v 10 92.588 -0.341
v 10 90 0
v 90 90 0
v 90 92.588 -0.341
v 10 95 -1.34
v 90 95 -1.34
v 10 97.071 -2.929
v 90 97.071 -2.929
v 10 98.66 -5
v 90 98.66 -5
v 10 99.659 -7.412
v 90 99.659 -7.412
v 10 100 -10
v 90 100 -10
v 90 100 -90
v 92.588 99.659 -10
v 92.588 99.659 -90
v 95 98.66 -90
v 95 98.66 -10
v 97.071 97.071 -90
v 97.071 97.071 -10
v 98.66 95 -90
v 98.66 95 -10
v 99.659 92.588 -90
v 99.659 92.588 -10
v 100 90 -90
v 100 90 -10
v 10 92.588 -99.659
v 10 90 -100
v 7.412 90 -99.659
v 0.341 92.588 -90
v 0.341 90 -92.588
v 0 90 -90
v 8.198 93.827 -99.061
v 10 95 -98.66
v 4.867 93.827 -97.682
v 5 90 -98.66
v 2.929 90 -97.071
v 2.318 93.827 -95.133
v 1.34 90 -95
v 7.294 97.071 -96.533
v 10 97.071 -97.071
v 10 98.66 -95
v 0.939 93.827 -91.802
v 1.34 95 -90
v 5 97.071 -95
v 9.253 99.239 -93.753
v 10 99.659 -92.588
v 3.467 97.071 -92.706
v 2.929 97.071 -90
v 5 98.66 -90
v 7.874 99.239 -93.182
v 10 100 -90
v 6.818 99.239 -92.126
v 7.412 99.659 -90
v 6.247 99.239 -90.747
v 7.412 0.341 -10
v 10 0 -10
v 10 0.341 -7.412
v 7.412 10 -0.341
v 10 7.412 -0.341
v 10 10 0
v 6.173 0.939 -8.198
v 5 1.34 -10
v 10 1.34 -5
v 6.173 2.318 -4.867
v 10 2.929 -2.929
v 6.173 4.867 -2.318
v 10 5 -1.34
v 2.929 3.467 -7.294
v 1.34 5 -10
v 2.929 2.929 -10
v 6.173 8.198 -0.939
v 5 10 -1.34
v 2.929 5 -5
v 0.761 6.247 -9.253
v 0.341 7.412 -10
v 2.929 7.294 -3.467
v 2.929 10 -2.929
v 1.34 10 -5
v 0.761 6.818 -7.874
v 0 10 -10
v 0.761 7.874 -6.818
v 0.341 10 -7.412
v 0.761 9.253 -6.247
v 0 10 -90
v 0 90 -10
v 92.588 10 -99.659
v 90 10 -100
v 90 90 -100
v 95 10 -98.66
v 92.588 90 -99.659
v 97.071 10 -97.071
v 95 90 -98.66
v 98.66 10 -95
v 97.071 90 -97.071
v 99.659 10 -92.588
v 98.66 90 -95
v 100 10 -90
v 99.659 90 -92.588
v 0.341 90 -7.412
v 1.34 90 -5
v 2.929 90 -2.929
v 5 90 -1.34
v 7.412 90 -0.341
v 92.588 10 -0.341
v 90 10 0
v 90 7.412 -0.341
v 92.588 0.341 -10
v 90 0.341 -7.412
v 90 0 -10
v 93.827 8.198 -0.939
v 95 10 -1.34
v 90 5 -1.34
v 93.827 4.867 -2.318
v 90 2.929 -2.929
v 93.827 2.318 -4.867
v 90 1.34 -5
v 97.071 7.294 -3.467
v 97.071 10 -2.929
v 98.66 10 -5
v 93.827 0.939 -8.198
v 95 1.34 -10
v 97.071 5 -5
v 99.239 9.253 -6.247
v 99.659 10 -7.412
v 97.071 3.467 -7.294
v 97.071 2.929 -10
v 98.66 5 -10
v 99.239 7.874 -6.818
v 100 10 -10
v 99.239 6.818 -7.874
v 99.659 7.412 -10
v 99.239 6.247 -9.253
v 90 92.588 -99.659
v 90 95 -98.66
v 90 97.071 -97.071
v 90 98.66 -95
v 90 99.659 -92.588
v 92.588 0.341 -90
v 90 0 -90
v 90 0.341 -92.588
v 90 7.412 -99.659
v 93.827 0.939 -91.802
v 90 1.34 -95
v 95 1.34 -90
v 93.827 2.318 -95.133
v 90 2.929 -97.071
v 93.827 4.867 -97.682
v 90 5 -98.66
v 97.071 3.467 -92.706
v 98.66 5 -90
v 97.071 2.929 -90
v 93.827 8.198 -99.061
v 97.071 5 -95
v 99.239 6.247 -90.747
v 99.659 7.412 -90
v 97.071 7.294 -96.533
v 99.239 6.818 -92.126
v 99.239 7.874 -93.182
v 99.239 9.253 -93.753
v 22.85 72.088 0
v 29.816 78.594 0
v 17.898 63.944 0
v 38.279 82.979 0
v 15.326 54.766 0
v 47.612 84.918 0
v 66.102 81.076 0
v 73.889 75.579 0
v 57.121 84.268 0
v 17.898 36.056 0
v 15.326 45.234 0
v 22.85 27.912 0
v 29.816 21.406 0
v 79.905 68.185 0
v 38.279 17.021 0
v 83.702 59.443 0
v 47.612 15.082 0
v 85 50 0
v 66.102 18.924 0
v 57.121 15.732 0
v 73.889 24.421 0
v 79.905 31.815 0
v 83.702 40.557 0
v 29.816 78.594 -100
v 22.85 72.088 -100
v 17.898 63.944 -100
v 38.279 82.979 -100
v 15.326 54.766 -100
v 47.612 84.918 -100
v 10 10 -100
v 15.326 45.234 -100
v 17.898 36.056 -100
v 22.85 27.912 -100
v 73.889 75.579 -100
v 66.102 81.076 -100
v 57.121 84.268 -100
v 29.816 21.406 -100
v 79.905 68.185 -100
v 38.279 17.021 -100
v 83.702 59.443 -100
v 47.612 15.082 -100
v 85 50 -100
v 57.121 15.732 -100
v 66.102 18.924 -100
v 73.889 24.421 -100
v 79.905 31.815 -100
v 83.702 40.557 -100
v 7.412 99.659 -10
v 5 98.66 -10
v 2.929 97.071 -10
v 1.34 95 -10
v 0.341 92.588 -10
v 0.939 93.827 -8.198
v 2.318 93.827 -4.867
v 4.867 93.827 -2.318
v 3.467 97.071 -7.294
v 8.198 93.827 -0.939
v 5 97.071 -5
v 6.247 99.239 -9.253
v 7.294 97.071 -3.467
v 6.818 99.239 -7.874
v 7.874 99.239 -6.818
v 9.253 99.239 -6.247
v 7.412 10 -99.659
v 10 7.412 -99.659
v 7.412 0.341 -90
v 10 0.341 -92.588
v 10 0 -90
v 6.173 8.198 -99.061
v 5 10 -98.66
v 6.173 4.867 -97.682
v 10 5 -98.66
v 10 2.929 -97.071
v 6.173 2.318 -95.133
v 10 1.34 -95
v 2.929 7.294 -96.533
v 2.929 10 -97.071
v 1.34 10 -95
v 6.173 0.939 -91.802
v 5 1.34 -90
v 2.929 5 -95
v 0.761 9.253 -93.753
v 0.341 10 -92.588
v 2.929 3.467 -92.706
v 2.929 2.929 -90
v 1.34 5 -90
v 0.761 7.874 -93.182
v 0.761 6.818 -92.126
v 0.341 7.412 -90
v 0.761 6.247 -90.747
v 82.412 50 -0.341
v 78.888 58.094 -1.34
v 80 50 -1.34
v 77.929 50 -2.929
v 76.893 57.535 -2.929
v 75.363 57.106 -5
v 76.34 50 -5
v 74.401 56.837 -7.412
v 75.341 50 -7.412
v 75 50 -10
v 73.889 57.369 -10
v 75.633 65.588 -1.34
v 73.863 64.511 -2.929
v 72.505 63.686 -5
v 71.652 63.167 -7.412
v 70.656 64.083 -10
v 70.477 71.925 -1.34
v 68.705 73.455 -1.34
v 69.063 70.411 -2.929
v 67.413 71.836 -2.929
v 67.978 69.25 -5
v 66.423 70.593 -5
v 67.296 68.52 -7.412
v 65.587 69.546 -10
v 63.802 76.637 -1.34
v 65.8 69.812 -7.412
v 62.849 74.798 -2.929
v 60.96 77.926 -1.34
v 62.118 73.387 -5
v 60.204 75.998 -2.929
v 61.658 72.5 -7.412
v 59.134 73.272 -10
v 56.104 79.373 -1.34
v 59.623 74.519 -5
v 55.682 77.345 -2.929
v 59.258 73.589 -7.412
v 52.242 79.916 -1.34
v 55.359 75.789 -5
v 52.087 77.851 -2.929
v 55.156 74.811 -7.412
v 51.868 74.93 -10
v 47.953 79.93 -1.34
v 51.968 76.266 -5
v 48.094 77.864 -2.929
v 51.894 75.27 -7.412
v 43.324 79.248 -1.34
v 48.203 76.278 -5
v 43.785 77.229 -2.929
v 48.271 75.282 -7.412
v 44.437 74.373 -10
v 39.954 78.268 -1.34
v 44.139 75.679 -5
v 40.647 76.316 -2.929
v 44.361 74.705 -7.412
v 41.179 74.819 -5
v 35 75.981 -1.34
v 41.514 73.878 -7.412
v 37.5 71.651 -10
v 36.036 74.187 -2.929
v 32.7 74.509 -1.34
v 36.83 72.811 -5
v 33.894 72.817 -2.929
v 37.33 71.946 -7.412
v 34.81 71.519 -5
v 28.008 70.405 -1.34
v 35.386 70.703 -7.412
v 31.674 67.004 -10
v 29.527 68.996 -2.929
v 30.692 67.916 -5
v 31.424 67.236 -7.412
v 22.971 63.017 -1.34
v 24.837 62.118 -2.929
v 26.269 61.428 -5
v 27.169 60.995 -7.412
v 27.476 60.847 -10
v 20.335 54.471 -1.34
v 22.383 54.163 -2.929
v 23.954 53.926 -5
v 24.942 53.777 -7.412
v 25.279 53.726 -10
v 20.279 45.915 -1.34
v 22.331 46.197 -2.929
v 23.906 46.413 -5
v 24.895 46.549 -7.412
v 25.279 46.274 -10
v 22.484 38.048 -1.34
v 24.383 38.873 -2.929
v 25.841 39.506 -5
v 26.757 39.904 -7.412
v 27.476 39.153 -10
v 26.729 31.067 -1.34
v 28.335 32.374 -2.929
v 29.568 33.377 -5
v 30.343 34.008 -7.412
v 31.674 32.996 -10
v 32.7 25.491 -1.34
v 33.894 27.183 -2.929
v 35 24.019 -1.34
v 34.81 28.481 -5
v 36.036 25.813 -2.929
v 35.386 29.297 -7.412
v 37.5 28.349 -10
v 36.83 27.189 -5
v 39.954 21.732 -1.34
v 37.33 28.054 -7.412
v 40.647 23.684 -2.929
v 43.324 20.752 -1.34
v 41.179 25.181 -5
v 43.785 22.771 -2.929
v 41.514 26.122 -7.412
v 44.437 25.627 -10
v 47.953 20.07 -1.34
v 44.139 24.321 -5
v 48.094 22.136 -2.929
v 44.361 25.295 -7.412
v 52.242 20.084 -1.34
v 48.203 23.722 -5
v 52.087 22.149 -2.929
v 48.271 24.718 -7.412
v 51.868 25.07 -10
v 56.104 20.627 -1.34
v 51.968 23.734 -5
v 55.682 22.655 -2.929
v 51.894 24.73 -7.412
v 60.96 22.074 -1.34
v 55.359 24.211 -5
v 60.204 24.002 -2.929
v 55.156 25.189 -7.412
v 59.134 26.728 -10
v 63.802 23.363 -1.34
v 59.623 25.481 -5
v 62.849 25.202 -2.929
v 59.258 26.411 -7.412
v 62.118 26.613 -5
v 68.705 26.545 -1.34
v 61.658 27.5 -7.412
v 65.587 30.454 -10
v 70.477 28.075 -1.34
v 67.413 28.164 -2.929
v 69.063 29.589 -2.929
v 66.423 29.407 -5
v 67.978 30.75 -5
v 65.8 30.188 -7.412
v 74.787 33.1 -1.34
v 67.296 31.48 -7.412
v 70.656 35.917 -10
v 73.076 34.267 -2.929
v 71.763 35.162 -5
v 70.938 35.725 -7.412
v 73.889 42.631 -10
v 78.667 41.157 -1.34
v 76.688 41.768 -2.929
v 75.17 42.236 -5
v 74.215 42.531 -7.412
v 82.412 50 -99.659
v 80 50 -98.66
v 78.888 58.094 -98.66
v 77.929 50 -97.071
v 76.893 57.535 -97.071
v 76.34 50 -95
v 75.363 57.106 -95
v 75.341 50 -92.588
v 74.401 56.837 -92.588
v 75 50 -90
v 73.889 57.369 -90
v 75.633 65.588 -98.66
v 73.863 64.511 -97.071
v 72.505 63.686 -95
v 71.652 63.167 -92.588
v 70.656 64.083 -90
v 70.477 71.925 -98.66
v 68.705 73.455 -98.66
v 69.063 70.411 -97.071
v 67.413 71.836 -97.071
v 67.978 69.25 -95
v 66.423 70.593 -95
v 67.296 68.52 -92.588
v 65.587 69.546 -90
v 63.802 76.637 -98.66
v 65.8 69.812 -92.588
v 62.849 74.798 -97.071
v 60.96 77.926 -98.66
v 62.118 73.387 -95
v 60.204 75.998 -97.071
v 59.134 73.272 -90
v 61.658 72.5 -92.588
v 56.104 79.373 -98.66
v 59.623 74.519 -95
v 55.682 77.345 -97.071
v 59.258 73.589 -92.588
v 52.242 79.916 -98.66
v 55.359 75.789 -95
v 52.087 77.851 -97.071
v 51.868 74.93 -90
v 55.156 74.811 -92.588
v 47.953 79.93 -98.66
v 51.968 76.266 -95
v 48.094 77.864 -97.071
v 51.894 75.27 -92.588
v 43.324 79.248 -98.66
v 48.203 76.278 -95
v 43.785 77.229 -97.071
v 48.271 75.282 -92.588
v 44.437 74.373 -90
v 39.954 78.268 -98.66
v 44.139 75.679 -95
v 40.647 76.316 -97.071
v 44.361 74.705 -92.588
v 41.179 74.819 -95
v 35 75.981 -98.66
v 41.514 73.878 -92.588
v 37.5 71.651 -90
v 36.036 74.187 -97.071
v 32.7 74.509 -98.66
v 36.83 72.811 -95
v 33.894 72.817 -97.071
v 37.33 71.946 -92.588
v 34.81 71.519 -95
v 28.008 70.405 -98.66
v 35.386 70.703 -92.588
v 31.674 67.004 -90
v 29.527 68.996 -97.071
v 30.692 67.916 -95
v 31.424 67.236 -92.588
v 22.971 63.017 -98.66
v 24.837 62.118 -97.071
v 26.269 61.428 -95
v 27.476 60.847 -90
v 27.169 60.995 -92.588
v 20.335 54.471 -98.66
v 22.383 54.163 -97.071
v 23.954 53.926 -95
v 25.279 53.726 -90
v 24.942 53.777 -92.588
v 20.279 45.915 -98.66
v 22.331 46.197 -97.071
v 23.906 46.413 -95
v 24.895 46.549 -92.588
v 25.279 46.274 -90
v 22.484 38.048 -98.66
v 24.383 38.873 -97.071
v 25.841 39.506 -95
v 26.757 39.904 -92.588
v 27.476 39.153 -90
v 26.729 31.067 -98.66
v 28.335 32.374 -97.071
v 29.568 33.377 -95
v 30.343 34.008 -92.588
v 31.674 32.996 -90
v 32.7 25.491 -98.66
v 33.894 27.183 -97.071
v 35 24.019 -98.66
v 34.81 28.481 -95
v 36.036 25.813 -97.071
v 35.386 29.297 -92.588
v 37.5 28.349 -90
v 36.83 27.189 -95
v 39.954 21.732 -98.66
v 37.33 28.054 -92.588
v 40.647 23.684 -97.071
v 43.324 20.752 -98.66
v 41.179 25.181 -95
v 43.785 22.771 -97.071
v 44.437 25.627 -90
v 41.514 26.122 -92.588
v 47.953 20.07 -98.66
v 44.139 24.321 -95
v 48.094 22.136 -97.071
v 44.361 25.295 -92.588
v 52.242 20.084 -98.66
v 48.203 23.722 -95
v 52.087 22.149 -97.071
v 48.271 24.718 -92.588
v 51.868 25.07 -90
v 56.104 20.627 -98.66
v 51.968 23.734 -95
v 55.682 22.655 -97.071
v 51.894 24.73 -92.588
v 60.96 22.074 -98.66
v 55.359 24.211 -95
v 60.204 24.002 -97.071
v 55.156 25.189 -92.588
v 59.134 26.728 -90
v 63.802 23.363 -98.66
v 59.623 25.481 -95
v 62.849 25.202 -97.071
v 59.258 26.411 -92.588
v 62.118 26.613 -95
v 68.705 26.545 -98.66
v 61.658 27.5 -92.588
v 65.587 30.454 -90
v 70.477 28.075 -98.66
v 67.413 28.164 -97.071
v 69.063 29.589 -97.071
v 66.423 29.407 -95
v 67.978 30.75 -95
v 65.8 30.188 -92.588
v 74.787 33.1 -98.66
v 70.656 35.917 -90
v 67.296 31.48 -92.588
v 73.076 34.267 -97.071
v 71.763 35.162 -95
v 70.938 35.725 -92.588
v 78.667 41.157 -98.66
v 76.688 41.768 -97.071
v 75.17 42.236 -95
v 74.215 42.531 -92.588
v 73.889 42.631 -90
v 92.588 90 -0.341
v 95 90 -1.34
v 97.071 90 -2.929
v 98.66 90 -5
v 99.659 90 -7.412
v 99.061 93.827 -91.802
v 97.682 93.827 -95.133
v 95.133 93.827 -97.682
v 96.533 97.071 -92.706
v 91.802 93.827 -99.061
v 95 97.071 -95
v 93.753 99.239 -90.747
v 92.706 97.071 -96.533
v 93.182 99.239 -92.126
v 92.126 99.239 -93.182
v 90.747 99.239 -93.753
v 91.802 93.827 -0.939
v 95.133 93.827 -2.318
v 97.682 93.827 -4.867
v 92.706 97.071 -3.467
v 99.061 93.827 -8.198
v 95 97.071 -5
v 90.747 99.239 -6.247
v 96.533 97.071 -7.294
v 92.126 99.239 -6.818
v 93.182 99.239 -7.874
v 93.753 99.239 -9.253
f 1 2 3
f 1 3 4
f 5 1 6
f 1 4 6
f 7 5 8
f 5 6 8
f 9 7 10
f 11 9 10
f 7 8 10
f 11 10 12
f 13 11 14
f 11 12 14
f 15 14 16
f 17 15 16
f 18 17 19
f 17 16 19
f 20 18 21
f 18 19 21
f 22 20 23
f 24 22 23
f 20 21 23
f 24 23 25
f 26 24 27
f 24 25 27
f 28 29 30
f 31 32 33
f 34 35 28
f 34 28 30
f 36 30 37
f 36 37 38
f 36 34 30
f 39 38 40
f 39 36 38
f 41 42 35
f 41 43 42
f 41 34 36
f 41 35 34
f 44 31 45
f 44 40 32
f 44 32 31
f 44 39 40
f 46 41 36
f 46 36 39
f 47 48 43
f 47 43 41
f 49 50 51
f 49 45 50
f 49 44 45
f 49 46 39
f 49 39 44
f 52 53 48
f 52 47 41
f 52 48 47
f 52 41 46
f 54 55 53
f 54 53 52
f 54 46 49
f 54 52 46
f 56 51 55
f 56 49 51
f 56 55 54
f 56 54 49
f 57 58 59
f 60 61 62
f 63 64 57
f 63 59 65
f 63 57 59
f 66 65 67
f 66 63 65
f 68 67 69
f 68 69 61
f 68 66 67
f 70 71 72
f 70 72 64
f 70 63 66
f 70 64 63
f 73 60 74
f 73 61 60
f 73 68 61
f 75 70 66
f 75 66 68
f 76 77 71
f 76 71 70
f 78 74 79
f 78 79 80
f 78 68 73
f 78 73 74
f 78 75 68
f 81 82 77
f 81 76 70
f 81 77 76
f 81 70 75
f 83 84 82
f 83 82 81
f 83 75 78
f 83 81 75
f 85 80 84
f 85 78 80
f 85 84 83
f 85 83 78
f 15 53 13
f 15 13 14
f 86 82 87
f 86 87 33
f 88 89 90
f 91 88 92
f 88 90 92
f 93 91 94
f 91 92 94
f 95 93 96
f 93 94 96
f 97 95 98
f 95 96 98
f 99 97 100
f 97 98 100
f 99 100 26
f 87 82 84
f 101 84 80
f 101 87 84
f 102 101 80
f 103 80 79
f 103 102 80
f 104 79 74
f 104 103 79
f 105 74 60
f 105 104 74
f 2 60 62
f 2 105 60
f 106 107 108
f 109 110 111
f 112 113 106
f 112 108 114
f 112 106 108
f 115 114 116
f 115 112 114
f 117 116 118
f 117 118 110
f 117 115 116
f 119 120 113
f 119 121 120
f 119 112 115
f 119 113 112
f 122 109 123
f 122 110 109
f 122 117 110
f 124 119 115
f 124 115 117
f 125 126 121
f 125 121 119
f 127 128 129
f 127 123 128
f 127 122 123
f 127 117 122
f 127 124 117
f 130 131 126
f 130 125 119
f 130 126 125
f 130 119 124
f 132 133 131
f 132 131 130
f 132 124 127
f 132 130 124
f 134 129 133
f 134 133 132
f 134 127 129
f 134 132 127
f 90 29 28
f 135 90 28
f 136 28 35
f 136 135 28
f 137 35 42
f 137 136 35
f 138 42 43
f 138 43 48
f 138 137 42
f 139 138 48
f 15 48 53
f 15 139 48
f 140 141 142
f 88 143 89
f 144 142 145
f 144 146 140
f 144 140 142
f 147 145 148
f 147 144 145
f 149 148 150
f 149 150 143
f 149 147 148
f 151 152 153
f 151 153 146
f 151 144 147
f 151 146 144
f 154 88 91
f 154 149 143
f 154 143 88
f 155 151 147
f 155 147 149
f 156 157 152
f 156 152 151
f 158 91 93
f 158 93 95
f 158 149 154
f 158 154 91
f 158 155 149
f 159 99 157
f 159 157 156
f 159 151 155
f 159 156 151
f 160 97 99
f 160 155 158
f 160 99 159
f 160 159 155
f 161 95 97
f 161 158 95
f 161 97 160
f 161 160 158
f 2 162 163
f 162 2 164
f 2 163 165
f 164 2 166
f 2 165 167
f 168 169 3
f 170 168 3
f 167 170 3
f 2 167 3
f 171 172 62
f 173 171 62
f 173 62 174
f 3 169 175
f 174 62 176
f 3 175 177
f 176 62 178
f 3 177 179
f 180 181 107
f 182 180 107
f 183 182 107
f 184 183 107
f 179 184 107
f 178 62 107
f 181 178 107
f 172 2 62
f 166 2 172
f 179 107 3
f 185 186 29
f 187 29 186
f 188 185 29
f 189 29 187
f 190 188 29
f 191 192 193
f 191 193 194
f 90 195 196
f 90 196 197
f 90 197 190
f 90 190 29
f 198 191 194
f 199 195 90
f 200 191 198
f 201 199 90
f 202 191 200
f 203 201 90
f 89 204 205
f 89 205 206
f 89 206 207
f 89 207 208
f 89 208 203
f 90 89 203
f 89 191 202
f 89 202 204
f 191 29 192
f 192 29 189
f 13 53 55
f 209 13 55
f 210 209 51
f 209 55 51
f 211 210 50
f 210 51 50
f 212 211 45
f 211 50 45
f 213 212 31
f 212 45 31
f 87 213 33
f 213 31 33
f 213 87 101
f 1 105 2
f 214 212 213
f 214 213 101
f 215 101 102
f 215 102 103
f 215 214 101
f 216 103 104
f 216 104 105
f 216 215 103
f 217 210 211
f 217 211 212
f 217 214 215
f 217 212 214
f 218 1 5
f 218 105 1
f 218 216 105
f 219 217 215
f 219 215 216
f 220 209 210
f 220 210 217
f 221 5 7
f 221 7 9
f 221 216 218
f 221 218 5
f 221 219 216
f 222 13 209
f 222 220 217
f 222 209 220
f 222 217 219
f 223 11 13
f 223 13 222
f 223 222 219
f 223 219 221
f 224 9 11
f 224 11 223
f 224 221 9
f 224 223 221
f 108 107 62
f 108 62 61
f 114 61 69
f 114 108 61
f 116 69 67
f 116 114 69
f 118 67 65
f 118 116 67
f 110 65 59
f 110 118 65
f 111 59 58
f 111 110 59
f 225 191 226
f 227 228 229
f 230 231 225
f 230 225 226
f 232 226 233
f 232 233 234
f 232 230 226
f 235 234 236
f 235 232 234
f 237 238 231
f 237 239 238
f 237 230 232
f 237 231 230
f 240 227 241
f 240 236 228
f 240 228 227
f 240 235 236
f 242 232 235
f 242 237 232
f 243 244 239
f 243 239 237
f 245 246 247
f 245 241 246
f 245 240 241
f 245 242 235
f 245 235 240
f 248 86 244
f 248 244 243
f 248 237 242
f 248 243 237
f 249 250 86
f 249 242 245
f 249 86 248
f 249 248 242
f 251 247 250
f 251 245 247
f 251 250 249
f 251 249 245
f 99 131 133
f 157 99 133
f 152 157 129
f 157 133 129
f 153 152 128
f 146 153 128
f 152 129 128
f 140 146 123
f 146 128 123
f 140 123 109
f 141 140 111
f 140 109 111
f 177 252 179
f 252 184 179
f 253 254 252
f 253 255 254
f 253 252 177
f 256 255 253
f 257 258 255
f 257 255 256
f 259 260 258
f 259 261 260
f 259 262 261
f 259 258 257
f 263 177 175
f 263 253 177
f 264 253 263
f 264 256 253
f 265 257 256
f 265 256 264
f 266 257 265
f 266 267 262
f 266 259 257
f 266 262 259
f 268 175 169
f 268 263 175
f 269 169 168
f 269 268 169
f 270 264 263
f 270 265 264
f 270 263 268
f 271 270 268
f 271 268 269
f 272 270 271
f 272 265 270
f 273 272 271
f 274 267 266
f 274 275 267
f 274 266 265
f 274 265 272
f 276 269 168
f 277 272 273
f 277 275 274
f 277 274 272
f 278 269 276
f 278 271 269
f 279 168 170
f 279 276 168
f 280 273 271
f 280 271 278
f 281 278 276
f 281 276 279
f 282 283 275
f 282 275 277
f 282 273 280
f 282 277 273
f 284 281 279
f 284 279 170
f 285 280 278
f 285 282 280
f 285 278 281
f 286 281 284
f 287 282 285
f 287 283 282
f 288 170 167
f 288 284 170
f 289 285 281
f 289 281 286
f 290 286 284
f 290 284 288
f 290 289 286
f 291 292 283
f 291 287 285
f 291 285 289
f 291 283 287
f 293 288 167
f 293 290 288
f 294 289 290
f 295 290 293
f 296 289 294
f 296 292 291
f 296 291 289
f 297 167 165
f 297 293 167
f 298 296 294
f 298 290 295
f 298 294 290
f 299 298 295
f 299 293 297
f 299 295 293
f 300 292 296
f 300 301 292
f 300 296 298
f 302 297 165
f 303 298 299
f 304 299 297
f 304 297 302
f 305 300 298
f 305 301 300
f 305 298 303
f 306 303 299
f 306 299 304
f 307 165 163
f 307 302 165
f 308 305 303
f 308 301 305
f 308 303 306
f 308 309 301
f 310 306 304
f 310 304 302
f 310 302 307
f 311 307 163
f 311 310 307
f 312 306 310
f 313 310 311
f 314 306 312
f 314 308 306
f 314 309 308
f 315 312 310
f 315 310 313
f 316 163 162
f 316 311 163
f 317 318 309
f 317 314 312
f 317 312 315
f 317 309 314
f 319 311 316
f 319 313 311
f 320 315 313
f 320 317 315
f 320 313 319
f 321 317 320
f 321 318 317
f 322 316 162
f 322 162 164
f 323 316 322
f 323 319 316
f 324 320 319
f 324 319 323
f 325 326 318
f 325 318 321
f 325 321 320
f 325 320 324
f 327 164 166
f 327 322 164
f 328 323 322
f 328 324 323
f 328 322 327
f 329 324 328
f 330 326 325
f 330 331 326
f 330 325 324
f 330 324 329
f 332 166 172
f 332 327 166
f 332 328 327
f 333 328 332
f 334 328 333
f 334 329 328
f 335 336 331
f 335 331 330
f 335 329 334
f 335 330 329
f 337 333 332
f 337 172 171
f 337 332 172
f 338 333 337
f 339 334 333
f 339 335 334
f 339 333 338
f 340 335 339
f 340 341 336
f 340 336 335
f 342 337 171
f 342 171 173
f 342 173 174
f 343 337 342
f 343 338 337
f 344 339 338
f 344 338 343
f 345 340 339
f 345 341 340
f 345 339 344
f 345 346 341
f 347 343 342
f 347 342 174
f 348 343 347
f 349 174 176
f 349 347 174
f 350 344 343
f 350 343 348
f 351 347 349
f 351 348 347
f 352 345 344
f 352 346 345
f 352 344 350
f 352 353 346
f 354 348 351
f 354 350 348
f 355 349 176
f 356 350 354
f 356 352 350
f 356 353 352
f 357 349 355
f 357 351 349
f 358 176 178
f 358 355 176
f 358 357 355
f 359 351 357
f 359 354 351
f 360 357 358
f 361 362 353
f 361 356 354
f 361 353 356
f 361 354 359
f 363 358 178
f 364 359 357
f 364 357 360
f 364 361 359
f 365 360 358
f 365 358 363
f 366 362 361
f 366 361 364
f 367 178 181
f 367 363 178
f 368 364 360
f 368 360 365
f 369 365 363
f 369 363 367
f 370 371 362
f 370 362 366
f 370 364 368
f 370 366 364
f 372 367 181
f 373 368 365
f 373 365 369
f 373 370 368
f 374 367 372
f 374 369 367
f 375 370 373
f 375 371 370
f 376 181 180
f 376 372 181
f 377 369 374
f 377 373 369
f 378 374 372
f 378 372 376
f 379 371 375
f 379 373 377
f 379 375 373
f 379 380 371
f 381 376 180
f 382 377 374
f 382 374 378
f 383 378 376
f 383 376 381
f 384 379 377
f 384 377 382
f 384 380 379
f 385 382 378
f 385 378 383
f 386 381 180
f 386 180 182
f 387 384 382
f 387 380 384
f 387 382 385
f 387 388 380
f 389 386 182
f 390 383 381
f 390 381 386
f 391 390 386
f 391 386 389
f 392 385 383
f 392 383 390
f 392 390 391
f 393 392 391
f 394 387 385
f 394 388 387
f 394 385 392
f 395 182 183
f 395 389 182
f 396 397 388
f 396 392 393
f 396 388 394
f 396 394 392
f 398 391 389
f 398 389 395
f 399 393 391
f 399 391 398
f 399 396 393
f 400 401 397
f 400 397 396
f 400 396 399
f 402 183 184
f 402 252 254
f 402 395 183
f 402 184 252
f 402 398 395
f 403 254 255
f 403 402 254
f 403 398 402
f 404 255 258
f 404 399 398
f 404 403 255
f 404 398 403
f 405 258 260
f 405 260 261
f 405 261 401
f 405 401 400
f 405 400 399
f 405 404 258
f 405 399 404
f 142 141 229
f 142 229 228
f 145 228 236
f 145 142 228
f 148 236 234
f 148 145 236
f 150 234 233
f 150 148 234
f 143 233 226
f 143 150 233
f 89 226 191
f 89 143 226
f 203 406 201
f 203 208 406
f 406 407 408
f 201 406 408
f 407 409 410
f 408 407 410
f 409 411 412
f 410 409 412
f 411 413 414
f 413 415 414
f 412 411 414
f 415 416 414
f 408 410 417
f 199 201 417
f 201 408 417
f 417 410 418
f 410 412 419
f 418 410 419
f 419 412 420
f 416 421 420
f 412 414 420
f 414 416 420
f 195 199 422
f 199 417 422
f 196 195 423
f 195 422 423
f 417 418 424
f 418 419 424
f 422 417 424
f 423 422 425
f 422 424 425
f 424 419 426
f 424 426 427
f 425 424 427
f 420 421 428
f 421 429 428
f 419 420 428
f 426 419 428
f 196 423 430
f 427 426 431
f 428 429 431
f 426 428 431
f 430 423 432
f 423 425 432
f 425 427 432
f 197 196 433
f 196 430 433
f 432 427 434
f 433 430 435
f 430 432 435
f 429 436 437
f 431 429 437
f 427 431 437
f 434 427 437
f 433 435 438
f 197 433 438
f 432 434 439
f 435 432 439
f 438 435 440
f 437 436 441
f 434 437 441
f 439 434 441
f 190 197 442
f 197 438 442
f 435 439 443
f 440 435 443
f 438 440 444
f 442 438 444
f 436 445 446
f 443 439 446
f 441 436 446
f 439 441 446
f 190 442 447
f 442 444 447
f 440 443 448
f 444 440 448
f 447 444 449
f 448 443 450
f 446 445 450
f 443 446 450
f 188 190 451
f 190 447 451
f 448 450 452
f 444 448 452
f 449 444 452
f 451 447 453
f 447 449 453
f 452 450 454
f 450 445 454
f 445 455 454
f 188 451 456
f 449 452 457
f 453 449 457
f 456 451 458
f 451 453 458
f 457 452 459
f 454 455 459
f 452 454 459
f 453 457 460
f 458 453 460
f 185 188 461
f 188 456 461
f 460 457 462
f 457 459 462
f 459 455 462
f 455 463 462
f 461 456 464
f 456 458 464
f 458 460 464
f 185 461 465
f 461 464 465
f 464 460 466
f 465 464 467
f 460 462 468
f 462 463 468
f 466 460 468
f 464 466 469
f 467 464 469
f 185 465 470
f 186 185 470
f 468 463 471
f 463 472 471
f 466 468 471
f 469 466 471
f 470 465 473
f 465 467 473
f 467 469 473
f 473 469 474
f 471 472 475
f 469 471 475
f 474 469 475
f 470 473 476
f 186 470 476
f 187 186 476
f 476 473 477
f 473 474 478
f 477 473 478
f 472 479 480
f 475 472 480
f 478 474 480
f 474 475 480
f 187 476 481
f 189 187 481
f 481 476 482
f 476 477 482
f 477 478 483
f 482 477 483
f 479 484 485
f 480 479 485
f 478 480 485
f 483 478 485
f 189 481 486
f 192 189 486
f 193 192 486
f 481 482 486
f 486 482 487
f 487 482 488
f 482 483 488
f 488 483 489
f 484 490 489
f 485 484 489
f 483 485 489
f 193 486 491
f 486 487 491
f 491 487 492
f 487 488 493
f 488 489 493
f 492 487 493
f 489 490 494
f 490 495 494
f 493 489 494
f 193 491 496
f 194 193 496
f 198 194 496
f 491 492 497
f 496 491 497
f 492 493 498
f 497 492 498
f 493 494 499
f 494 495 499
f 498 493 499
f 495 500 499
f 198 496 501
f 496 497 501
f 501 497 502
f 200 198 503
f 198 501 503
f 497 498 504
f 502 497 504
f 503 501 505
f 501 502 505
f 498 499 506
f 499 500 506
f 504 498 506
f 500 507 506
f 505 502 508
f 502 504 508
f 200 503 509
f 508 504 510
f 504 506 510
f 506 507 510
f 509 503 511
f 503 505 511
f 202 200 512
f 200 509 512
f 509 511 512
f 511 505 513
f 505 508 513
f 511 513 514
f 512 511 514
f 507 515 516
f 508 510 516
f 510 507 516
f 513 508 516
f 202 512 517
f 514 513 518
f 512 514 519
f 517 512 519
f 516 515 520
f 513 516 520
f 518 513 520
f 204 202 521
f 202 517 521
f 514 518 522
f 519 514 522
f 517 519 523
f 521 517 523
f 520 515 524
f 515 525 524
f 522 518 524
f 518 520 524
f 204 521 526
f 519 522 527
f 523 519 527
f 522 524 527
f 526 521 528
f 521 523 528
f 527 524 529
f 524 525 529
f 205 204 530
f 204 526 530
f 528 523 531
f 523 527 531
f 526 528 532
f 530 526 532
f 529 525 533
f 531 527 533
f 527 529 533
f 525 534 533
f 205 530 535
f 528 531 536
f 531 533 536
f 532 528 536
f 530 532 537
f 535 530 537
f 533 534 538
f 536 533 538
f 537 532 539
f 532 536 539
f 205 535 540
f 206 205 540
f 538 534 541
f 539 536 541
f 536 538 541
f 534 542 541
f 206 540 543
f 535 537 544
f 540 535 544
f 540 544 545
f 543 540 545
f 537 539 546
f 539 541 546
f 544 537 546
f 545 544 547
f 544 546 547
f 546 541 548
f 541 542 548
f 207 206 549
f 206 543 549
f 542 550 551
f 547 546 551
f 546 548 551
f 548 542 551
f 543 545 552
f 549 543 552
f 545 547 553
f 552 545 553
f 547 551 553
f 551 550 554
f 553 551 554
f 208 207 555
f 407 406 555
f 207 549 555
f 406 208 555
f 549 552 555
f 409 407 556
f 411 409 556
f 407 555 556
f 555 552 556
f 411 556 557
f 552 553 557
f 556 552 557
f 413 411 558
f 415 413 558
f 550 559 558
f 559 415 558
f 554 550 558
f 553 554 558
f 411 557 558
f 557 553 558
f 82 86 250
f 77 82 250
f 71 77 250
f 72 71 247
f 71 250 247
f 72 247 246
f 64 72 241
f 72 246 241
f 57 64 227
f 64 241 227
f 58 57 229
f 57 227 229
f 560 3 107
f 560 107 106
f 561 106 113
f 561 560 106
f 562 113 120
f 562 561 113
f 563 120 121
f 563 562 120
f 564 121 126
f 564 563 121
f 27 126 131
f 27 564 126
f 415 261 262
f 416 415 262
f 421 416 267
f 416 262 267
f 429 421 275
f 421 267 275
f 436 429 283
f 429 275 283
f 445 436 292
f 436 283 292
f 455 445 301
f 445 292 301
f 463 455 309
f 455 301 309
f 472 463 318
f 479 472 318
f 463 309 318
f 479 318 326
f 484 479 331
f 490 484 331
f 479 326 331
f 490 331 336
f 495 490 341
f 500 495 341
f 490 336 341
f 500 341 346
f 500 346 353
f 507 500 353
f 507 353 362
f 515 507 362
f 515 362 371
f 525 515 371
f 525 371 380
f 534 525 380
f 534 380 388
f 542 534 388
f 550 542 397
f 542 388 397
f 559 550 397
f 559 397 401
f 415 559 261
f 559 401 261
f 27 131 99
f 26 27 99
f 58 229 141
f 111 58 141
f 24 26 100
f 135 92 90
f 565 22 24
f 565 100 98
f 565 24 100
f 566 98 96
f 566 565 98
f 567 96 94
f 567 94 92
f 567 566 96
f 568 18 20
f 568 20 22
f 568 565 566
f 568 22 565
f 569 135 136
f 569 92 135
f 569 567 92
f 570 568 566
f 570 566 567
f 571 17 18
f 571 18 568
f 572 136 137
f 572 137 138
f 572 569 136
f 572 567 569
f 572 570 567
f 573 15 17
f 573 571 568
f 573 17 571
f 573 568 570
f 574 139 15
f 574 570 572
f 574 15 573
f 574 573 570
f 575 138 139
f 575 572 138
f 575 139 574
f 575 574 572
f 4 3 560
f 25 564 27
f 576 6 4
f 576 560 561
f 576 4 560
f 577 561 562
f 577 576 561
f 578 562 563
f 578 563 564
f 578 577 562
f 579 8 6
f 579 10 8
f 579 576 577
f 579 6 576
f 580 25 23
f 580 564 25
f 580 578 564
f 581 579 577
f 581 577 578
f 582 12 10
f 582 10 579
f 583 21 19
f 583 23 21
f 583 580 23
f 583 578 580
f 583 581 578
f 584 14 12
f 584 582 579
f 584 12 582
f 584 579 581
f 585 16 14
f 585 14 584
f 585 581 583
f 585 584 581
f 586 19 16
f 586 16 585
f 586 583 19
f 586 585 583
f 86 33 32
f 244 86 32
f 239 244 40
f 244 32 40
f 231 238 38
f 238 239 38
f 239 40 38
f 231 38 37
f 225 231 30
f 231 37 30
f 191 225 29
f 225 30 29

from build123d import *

# Parameters (mm, degrees)
SKETCH2_W           = 100
SKETCH2_H           = 100
BOSS_EXTRUDE1_DEPTH = 100
SKETCH3_R           = 25
CUT_EXTRUDE1_DEPTH  = 100
FILLET1_R           = 10
FILLET2_R           = 10
FILLET3_R           = 10
FILLET4_R           = 10


with BuildPart() as part:
    # Sketch2 → Boss-Extrude1 (new body)
    with BuildSketch(Plane(origin=(0, 0, 0), x_dir=(1, 0, 0), z_dir=(0, 1, 0))):
        with Locations((50, 50)):
            Rectangle(SKETCH2_W, SKETCH2_H)
    extrude(amount=BOSS_EXTRUDE1_DEPTH)

    # Sketch3 → Cut-Extrude1 (cut)
    with BuildSketch(Plane.XY):
        with Locations((50, 50)):
            Circle(SKETCH3_R)
    extrude(amount=-CUT_EXTRUDE1_DEPTH, mode=Mode.SUBTRACT)

    # Fillet1
    fillet1_edges = [part.edges().sort_by_distance(p)[0] for p in [
        (25, 50, 0),
        (50, 0, 0),
        (100, 50, 0),
        (0, 50, 0),
        (50, 100, 0),
    ]]
    fillet(fillet1_edges, radius=FILLET1_R)

    # Fillet2
    fillet2_edges = [part.edges().sort_by_distance(p)[0] for p in [
        (25, 50, -100),
        (50, 100, -100),
        (50, 0, -100),
        (0, 50, -100),
        (100, 50, -100),
    ]]
    fillet(fillet2_edges, radius=FILLET2_R)

    # Fillet3
    # the kernel refuses this fillet: 10 mm, written as the material it takes off along each edge
    with BuildSketch(Plane(origin=(90, 90, -10), x_dir=(1, 0, 0), z_dir=(0, 1, 0))) as fillet3_piece_1_section:
        Polygon((0, 0), (FILLET3_R, 0), (FILLET3_R, -FILLET3_R), (0, -FILLET3_R), align=None)
    fillet3_piece_1 = extrude(amount=FILLET3_R, mode=Mode.PRIVATE)
    fillet3_piece_1 = fillet3_piece_1 - Plane(origin=(90, 90, -10), x_dir=(-0.7071067811865475, 0, -0.7071067811865475), z_dir=(0, 1, 0)) * Sphere(FILLET3_R, mode=Mode.PRIVATE)
    add(fillet3_piece_1, mode=Mode.SUBTRACT)
    with BuildSketch(Plane(origin=(90, 10, -10), x_dir=(0, -1, 0), z_dir=(1, 0, 0))) as fillet3_piece_2_section:
        Polygon((0, 0), (FILLET3_R, 0), (FILLET3_R, -FILLET3_R), (0, -FILLET3_R), align=None)
    fillet3_piece_2 = extrude(amount=FILLET3_R, mode=Mode.PRIVATE)
    fillet3_piece_2 = fillet3_piece_2 - Plane(origin=(90, 10, -10), x_dir=(0, 0.7071067811865475, -0.7071067811865475), z_dir=(1, 0, 0)) * Sphere(FILLET3_R, mode=Mode.PRIVATE)
    add(fillet3_piece_2, mode=Mode.SUBTRACT)
    with BuildSketch(Plane(origin=(90, 90, -90), x_dir=(1, 0, 0), z_dir=(0, 1, 0))) as fillet3_piece_3_section:
        Polygon((0, 0), (FILLET3_R, 0), (FILLET3_R, FILLET3_R), (0, FILLET3_R), align=None)
    fillet3_piece_3 = extrude(amount=FILLET3_R, mode=Mode.PRIVATE)
    fillet3_piece_3 = fillet3_piece_3 - Plane(origin=(90, 90, -90), x_dir=(-0.7071067811865475, 0, 0.7071067811865475), z_dir=(0, 1, 0)) * Sphere(FILLET3_R, mode=Mode.PRIVATE)
    add(fillet3_piece_3, mode=Mode.SUBTRACT)
    with BuildSketch(Plane(origin=(90, 10, -90), x_dir=(0, -1, 0), z_dir=(1, 0, 0))) as fillet3_piece_4_section:
        Polygon((0, 0), (FILLET3_R, 0), (FILLET3_R, FILLET3_R), (0, FILLET3_R), align=None)
    fillet3_piece_4 = extrude(amount=FILLET3_R, mode=Mode.PRIVATE)
    fillet3_piece_4 = fillet3_piece_4 - Plane(origin=(90, 10, -90), x_dir=(0, 0.7071067811865475, 0.7071067811865475), z_dir=(1, 0, 0)) * Sphere(FILLET3_R, mode=Mode.PRIVATE)
    add(fillet3_piece_4, mode=Mode.SUBTRACT)
    with BuildSketch(Plane(origin=(100, 100, -10), x_dir=(-1, 0, 0), z_dir=(0, 0, -1)), Plane(origin=(100, 0, -10), x_dir=(0, 1, 0), z_dir=(0, 0, -1))) as fillet3_piece_5:
        with BuildLine():
            CenterArc((FILLET3_R, -FILLET3_R), FILLET3_R, 90, 90)
            Line((0, -FILLET3_R), (0, 0))
            Line((0, 0), (FILLET3_R, 0))
        make_face()
    extrude(amount=80, mode=Mode.SUBTRACT)

    # Fillet4
    # the kernel refuses this fillet: 10 mm, written as the material it takes off along each edge
    with BuildSketch(Plane(origin=(10, 90, -10), x_dir=(-1, 0, 0), z_dir=(0, 1, 0))) as fillet4_piece_1_section:
        Polygon((0, 0), (FILLET4_R, 0), (FILLET4_R, FILLET4_R), (0, FILLET4_R), align=None)
    fillet4_piece_1 = extrude(amount=FILLET4_R, mode=Mode.PRIVATE)
    fillet4_piece_1 = fillet4_piece_1 - Plane(origin=(10, 90, -10), x_dir=(0.7071067811865475, 0, -0.7071067811865475), z_dir=(0, 1, 0)) * Sphere(FILLET4_R, mode=Mode.PRIVATE)
    add(fillet4_piece_1, mode=Mode.SUBTRACT)
    with BuildSketch(Plane(origin=(10, 10, -10), x_dir=(0, -1, 0), z_dir=(-1, 0, 0))) as fillet4_piece_2_section:
        Polygon((0, 0), (FILLET4_R, 0), (FILLET4_R, FILLET4_R), (0, FILLET4_R), align=None)
    fillet4_piece_2 = extrude(amount=FILLET4_R, mode=Mode.PRIVATE)
    fillet4_piece_2 = fillet4_piece_2 - Plane(origin=(10, 10, -10), x_dir=(0, 0.7071067811865475, -0.7071067811865475), z_dir=(-1, 0, 0)) * Sphere(FILLET4_R, mode=Mode.PRIVATE)
    add(fillet4_piece_2, mode=Mode.SUBTRACT)
    with BuildSketch(Plane(origin=(10, 90, -90), x_dir=(-1, 0, 0), z_dir=(0, 1, 0))) as fillet4_piece_3_section:
        Polygon((0, 0), (FILLET4_R, 0), (FILLET4_R, -FILLET4_R), (0, -FILLET4_R), align=None)
    fillet4_piece_3 = extrude(amount=FILLET4_R, mode=Mode.PRIVATE)
    fillet4_piece_3 = fillet4_piece_3 - Plane(origin=(10, 90, -90), x_dir=(0.7071067811865475, 0, 0.7071067811865475), z_dir=(0, 1, 0)) * Sphere(FILLET4_R, mode=Mode.PRIVATE)
    add(fillet4_piece_3, mode=Mode.SUBTRACT)
    with BuildSketch(Plane(origin=(10, 10, -90), x_dir=(0, -1, 0), z_dir=(-1, 0, 0))) as fillet4_piece_4_section:
        Polygon((0, 0), (FILLET4_R, 0), (FILLET4_R, -FILLET4_R), (0, -FILLET4_R), align=None)
    fillet4_piece_4 = extrude(amount=FILLET4_R, mode=Mode.PRIVATE)
    fillet4_piece_4 = fillet4_piece_4 - Plane(origin=(10, 10, -90), x_dir=(0, 0.7071067811865475, 0.7071067811865475), z_dir=(-1, 0, 0)) * Sphere(FILLET4_R, mode=Mode.PRIVATE)
    add(fillet4_piece_4, mode=Mode.SUBTRACT)
    with BuildSketch(Plane(origin=(0, 100, -90), x_dir=(1, 0, 0), z_dir=(0, 0, 1)), Plane(origin=(0, 0, -90), x_dir=(0, 1, 0), z_dir=(0, 0, 1))) as fillet4_piece_5:
        with BuildLine():
            CenterArc((FILLET4_R, -FILLET4_R), FILLET4_R, 90, 90)
            Line((0, -FILLET4_R), (0, 0))
            Line((0, 0), (FILLET4_R, 0))
        make_face()
    extrude(amount=80, mode=Mode.SUBTRACT)


solid = part.part
